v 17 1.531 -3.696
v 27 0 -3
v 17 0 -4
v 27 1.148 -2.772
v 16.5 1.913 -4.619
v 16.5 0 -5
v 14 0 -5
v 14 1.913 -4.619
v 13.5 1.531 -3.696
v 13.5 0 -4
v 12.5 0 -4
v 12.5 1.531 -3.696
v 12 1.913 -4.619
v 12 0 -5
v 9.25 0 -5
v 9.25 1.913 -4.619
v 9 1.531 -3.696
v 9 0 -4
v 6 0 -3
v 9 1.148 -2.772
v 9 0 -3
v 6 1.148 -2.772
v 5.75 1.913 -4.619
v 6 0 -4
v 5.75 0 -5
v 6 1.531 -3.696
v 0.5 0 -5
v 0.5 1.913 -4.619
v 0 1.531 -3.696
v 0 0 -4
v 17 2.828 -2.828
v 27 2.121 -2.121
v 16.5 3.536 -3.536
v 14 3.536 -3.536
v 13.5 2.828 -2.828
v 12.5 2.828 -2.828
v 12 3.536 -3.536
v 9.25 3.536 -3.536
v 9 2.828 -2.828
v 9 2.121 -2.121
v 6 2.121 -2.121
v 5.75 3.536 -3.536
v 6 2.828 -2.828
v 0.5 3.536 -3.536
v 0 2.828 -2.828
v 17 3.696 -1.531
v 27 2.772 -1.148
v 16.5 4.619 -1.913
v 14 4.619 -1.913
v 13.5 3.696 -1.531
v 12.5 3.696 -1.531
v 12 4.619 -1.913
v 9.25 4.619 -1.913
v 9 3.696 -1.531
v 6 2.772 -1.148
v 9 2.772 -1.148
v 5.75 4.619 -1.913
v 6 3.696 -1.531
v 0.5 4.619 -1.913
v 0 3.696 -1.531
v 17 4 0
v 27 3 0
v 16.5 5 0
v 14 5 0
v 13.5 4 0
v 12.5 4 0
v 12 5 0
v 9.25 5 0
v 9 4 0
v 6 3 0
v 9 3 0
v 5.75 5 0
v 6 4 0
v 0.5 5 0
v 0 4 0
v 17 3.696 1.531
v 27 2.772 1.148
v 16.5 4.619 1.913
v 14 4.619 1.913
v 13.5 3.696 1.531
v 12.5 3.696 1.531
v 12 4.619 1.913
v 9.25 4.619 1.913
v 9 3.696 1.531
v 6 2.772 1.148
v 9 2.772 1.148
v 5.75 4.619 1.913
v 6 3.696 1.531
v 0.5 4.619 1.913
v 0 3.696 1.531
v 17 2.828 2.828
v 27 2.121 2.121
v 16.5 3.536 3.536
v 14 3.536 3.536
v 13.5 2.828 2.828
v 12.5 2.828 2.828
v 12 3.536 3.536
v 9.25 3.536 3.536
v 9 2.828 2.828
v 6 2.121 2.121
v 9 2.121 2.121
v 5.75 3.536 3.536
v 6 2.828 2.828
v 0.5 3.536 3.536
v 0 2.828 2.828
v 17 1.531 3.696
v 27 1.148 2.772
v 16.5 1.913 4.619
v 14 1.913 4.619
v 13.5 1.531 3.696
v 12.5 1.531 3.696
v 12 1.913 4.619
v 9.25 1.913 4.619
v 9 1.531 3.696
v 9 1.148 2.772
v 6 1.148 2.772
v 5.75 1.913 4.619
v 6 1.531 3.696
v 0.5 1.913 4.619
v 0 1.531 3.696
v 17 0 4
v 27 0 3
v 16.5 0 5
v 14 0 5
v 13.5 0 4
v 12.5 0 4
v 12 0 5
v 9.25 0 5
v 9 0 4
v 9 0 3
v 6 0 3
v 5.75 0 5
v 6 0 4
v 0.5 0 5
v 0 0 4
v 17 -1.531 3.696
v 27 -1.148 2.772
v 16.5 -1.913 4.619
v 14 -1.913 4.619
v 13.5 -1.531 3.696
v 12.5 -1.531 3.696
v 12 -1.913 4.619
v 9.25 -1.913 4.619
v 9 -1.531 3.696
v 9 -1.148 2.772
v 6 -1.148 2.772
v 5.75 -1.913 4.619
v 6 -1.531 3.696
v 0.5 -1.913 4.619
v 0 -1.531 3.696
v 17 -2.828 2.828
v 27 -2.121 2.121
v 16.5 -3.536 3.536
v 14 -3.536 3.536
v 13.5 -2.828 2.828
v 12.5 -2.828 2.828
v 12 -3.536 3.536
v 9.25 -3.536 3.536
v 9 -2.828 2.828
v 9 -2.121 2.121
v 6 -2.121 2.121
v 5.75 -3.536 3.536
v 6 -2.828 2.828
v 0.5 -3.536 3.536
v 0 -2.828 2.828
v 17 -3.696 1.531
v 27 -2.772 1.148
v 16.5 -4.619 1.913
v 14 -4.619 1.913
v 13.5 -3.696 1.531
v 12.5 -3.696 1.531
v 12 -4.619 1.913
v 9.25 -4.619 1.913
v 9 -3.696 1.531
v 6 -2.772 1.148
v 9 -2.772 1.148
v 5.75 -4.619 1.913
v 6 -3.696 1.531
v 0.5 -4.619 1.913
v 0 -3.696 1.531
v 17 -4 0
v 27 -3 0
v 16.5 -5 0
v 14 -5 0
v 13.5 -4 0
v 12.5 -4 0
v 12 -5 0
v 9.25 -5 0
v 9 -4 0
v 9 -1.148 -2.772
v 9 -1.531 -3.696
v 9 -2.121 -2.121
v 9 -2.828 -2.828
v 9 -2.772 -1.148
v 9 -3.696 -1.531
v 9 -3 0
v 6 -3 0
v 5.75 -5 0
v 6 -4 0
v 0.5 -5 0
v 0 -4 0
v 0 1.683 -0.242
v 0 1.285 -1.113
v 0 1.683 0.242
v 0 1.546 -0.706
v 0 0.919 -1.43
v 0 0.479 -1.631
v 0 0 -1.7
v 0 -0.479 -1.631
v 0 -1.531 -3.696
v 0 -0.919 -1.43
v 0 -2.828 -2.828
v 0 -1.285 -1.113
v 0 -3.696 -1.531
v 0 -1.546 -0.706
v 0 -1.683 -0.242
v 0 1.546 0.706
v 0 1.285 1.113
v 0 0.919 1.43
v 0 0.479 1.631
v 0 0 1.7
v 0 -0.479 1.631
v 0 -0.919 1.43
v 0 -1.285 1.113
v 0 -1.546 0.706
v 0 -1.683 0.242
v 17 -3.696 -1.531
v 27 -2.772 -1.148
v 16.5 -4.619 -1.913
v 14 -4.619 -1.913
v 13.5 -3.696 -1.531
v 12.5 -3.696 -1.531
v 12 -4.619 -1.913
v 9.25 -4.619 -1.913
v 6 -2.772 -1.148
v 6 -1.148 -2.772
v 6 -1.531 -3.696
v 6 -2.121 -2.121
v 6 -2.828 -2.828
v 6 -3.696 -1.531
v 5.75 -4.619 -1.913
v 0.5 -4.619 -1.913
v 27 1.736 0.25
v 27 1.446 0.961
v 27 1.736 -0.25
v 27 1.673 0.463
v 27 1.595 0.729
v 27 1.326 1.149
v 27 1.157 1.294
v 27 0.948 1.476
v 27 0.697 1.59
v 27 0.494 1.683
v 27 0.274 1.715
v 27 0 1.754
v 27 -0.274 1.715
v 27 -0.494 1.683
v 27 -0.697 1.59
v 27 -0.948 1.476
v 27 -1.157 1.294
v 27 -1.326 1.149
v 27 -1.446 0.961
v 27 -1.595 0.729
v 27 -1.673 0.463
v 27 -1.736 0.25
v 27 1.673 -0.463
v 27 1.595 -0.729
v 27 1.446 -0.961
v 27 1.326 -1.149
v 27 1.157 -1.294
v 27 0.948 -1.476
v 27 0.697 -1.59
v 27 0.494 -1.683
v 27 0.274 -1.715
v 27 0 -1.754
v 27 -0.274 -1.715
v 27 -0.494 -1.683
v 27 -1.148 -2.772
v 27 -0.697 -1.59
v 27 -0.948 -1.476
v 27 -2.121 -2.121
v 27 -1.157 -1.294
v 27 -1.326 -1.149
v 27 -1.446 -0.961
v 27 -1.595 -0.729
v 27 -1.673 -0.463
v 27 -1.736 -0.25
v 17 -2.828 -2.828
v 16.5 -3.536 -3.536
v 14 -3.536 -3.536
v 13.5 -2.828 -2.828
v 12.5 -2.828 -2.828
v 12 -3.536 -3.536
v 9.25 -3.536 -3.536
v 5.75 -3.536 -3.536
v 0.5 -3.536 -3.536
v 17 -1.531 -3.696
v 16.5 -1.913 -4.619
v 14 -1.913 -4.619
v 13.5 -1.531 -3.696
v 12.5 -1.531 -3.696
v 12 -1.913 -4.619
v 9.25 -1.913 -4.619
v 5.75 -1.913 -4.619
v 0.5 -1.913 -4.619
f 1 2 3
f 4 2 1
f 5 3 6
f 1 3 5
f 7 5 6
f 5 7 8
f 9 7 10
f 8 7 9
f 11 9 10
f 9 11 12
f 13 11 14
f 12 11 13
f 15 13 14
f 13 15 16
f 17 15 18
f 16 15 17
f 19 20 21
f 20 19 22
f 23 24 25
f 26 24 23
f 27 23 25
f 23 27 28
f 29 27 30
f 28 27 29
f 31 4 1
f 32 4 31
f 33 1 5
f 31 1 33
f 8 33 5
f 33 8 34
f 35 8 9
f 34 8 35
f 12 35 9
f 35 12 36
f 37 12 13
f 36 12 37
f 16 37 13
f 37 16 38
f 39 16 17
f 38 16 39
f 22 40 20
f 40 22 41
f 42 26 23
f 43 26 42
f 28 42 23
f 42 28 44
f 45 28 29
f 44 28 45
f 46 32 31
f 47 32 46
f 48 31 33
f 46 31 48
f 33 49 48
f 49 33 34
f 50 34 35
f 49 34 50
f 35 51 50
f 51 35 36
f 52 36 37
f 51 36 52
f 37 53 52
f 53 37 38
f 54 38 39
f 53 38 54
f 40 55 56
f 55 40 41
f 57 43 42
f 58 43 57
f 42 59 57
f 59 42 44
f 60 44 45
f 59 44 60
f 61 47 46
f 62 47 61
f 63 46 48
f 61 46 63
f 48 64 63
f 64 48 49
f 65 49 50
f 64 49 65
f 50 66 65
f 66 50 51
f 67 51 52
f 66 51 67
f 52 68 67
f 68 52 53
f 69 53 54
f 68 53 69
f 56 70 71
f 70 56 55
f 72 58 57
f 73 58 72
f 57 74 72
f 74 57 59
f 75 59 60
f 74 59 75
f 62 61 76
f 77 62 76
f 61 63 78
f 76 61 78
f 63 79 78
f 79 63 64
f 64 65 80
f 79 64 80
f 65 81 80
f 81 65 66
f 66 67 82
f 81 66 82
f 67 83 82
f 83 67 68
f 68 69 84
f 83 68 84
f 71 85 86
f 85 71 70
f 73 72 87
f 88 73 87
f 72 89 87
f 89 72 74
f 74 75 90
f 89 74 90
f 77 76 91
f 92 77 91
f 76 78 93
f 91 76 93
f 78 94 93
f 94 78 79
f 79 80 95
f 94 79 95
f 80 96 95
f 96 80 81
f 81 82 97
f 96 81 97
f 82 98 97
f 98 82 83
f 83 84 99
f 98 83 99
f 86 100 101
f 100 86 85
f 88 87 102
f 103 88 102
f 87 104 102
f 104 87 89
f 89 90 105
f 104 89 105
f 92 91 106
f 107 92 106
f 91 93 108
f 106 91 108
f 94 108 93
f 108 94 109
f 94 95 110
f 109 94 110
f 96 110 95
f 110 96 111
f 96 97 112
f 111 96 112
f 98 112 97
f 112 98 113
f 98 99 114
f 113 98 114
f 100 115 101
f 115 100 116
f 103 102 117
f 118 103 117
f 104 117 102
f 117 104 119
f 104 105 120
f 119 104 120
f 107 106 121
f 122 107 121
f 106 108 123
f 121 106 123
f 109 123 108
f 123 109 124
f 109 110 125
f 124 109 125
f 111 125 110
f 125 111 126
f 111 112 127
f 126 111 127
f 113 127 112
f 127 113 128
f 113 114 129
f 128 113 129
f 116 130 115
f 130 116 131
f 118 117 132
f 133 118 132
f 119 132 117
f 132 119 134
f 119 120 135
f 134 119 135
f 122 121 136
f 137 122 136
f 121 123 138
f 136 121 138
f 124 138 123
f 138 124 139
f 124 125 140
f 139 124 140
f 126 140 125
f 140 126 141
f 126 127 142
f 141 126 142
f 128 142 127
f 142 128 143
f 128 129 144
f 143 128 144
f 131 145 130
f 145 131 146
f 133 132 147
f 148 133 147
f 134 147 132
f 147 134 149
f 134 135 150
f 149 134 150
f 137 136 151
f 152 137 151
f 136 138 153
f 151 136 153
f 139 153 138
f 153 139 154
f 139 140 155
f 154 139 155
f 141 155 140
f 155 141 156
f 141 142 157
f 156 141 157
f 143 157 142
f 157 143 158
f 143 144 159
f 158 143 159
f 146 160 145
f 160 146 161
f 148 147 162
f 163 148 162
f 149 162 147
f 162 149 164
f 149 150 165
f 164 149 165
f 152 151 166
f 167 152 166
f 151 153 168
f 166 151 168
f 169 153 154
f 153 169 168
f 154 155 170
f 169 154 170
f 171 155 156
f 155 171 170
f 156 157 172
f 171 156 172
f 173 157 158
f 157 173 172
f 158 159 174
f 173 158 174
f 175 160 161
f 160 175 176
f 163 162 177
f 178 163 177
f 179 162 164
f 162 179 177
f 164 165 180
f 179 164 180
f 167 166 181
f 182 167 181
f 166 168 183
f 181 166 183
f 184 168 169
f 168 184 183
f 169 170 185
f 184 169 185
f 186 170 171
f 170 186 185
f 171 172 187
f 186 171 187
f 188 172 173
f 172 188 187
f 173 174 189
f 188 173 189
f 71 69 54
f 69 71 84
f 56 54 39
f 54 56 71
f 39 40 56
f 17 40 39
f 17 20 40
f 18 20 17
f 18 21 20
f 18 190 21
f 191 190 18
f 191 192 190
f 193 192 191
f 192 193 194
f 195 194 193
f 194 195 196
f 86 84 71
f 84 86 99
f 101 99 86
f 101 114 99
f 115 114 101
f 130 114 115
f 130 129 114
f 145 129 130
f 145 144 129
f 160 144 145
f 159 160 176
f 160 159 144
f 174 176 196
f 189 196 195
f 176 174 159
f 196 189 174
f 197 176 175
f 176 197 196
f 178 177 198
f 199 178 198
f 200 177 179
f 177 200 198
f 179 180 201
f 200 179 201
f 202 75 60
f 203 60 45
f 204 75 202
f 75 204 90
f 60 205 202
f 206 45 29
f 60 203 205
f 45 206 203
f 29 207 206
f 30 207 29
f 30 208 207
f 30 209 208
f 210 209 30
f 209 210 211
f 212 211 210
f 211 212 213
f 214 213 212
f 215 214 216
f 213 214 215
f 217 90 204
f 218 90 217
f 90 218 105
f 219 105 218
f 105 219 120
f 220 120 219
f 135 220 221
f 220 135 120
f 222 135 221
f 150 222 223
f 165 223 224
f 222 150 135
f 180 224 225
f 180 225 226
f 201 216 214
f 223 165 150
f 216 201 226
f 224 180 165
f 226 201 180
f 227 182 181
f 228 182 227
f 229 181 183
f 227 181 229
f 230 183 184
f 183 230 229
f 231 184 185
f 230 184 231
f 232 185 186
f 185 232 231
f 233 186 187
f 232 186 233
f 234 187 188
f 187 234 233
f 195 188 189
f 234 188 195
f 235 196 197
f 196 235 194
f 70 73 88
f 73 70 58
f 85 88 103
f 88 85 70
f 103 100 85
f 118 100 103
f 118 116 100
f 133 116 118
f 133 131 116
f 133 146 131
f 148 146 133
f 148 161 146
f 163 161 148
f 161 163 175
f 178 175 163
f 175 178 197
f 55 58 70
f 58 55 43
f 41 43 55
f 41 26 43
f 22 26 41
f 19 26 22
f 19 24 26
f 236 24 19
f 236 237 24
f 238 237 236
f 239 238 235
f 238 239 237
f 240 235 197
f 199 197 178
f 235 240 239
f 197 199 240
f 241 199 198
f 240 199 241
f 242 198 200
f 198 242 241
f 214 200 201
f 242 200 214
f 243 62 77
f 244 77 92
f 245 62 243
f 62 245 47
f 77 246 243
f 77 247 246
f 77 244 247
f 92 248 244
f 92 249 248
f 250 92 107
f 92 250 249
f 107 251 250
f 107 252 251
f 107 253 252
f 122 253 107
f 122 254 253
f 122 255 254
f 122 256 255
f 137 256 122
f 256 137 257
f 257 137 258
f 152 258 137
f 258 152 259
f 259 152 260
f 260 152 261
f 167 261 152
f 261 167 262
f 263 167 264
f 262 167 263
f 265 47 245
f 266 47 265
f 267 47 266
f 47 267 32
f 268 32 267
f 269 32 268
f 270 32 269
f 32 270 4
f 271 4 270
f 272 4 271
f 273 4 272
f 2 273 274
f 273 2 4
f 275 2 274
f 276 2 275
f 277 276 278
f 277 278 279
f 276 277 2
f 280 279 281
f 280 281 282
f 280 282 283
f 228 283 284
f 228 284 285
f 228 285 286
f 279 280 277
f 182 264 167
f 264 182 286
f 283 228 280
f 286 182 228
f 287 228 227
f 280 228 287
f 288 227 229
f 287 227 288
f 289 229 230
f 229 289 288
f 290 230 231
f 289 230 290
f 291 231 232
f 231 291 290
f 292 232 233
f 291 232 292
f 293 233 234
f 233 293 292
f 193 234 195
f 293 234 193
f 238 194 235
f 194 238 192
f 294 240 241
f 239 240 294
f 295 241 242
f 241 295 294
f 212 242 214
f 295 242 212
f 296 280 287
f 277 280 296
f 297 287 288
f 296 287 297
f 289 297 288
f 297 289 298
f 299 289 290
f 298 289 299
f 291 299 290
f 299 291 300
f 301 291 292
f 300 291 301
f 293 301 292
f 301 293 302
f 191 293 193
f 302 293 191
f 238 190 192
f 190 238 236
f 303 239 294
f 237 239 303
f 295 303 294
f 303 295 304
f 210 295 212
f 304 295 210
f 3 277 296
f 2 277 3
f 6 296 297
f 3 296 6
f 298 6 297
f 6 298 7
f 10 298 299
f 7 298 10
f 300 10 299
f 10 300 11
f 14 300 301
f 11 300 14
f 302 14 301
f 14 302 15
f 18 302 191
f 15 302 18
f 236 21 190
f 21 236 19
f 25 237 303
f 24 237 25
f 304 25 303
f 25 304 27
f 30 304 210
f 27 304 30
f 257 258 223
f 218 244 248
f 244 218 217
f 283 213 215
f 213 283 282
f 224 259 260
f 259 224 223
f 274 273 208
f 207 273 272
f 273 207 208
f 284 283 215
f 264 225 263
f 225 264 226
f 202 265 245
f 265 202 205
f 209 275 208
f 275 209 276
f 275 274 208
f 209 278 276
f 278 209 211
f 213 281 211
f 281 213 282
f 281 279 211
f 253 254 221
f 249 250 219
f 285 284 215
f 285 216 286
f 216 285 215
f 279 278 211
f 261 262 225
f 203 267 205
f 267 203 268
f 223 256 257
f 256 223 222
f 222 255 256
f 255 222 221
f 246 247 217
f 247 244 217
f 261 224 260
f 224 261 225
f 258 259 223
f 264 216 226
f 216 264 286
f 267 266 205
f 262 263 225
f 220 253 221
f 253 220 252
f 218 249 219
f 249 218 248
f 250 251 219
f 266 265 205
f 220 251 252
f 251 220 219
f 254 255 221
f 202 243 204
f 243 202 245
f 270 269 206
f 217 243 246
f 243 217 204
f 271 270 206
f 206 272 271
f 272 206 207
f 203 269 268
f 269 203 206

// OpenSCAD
// Lights1b
// Ferrules for 3 mm fiber optic sideglows

// Try a rotated build
p1=[ [0,0], [0,4], [0.5,5], [5.75,5], [6,4], [6,3], [9.,3], [9,4], [9.25,5], [12,5], [12.5,4], [13.5,4],
  [14,5], [16.5,5], [17,4], [27,3], [27,0] ];

difference(){
rotate([0,-90,0])
rotate_extrude(){
rotate([0,0,-90])
polygon(points=p1);
}    
color("cyan")
// measured 2.5, 2.6 diameter
//cylinder(r1=1.6,r2=1.7, h=50,$fn=22);

rotate([0,90,0])
// just a tad too large
//cylinder(r1=1.8,r2=1.9, h=50,$fn=22);
cylinder(r1=1.7,r2=1.8, h=50,$fn=22);
}



translate([0,0,0]) color("blue")
rotate([-3,90,0])
circle(2.0, center=true,$fn=6);
